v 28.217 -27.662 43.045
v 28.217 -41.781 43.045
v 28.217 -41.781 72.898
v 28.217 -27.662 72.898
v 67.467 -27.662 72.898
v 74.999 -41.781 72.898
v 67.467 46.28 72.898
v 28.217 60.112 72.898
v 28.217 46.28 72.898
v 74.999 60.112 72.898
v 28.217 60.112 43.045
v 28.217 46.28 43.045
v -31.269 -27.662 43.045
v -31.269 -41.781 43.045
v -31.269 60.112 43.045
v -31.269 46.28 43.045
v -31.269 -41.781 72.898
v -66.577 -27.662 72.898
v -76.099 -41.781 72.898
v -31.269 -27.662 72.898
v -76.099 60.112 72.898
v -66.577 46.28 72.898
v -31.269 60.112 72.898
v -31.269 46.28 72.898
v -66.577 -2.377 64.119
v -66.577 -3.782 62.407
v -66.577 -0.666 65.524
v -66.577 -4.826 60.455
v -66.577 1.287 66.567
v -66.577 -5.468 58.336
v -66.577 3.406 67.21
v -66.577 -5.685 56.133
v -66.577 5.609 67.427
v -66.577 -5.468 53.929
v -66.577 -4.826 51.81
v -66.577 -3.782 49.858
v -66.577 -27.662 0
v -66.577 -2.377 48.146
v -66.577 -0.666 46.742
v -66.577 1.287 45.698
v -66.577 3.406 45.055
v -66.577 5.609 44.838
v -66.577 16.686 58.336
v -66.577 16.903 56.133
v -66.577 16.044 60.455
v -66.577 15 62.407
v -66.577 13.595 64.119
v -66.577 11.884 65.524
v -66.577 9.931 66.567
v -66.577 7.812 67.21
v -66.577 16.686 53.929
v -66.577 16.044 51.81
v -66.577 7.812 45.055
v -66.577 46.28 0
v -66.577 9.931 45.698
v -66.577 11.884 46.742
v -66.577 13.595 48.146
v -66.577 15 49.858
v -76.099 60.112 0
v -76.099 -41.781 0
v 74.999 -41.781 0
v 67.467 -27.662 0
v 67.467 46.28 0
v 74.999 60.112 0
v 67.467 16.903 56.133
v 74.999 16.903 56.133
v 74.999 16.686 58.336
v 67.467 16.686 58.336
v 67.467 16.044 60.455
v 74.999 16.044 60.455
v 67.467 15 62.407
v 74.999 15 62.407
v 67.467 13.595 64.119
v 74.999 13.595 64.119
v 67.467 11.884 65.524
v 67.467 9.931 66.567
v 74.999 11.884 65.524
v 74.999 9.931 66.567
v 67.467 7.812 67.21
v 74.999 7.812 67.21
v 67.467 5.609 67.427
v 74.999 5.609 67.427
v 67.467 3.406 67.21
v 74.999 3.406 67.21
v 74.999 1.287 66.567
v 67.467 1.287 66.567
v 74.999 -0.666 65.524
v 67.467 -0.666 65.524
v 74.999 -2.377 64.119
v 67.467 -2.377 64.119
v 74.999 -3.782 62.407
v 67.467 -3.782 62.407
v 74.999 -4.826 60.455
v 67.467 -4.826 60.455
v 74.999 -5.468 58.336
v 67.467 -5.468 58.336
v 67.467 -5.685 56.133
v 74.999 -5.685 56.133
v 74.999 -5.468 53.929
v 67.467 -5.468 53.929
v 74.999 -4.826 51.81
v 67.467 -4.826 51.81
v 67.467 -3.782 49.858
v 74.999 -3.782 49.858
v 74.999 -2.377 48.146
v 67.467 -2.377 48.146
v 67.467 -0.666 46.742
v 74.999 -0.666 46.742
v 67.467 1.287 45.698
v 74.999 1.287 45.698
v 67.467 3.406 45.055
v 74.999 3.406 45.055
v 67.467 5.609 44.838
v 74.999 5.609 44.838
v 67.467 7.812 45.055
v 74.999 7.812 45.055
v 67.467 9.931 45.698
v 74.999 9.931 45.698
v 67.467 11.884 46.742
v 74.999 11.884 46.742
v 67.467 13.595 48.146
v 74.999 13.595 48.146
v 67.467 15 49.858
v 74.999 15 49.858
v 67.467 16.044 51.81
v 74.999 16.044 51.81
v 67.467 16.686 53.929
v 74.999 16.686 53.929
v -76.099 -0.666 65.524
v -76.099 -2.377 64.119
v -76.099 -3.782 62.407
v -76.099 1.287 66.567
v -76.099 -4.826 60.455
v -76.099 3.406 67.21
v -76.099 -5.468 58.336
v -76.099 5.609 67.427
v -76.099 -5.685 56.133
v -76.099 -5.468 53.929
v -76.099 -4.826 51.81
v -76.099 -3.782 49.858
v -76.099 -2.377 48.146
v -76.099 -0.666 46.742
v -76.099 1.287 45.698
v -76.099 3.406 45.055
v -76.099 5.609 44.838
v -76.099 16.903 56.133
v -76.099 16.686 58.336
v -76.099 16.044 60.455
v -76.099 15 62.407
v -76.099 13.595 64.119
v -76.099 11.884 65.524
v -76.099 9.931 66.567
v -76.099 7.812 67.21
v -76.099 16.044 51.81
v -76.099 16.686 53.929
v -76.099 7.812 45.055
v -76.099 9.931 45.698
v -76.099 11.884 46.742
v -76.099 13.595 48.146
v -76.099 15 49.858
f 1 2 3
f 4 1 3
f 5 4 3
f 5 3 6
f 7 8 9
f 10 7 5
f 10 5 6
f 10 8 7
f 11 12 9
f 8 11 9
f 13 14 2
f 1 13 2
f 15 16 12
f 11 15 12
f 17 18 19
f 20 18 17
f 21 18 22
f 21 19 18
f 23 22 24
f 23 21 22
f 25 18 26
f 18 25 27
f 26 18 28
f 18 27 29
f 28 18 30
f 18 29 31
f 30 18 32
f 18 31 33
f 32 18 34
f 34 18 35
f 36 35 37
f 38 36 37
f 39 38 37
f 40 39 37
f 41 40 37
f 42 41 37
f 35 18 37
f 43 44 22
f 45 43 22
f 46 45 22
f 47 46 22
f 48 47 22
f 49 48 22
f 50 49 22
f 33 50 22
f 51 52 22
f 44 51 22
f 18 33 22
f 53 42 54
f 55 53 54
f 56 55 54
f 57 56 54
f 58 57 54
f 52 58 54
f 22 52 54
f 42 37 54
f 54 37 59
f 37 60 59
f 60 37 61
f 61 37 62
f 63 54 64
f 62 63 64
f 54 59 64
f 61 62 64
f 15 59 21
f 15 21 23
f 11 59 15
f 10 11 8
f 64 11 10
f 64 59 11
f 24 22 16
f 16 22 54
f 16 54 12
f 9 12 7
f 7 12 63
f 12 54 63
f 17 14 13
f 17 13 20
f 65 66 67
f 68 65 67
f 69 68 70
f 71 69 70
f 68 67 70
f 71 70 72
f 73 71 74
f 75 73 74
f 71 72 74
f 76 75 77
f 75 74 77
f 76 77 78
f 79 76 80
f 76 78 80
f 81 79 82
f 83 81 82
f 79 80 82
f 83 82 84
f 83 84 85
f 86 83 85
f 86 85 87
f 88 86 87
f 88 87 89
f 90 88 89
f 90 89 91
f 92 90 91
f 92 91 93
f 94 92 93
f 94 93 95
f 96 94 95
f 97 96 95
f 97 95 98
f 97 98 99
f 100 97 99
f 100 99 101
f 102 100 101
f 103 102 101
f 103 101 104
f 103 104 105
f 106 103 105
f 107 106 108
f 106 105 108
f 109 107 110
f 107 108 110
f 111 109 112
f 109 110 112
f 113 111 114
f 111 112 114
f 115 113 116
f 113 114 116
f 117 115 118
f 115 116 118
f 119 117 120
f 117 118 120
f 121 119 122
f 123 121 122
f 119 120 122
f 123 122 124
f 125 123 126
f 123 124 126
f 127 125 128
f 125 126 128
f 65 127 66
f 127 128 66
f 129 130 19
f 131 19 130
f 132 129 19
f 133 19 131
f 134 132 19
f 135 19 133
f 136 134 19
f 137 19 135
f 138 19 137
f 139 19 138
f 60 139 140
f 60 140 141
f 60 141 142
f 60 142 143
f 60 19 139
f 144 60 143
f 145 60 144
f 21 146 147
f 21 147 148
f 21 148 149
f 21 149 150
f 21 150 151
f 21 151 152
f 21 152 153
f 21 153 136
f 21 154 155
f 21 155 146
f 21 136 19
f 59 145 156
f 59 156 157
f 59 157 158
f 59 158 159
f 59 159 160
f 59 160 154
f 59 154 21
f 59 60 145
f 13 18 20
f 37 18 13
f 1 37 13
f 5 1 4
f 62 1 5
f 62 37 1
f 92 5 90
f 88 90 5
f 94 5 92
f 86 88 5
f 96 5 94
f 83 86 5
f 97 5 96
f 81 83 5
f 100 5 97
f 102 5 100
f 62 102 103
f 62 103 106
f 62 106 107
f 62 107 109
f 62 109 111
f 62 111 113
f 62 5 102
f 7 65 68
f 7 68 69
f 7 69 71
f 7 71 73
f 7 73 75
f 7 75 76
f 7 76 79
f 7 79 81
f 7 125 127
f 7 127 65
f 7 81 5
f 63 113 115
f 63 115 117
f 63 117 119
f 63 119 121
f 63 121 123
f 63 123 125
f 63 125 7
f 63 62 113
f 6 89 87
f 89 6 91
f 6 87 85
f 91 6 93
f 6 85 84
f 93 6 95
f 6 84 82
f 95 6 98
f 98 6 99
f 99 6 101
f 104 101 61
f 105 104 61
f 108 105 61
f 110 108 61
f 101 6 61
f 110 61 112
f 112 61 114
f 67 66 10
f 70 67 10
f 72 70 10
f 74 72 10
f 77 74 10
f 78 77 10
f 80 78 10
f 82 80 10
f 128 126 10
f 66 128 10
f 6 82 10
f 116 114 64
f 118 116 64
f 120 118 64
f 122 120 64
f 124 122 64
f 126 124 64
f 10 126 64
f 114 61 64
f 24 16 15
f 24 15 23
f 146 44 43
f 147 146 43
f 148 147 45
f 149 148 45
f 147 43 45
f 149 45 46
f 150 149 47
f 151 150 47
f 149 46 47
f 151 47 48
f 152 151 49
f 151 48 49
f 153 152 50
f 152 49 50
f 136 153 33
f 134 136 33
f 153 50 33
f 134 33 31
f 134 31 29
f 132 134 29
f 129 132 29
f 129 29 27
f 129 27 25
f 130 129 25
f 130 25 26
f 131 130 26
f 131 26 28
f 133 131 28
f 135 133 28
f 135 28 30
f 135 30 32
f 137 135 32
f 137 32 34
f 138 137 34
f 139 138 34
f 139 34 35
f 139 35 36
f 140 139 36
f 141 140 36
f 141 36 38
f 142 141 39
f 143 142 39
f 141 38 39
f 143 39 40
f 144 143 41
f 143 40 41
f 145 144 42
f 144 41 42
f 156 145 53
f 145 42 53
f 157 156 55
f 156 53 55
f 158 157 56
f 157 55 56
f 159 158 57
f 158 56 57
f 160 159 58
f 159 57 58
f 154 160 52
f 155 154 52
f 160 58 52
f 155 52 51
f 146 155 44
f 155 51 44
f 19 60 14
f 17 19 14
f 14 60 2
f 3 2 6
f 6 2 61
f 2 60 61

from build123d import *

# Parameters (mm, degrees)
F0_W     = 151.0983854532
F0_H     = 101.8927358091
F0_W_2   = 134.0441703796
F0_H_2   = 73.9419609308
F1_DEPTH = 72.898
F2_W     = 59.4862736762
F2_H     = 29.8526170533
F3_DEPTH = 161.29
F4_R     = 11.294462473
F5_DEPTH = 227.838


with BuildPart() as f1:
    # F0 (on Top) → F1 (new body)
    with BuildSketch(Plane.XY):
        with Locations((-0.5501508713, 9.1656837612)):
            Rectangle(F0_W, F0_H)
        with Locations((0.444740057, 9.3090310693)):
            Rectangle(F0_W_2, F0_H_2, mode=Mode.SUBTRACT)
    extrude(amount=F1_DEPTH)

    # F2 (on face) → F3 (cut)
    with BuildSketch(Plane.XZ.offset(41.7806841433)):
        with Locations((-1.5259776264, 57.9716914734)):
            Rectangle(F2_W, F2_H)
    extrude(amount=-F3_DEPTH, mode=Mode.SUBTRACT)

    # F4 (on face) → F5 (cut)
    with BuildSketch(Plane.YZ.offset(74.9990418553)):
        with Locations((5.608974956, 56.1325512826)):
            Circle(F4_R)
    extrude(amount=-F5_DEPTH, mode=Mode.SUBTRACT)


solid = f1.part
